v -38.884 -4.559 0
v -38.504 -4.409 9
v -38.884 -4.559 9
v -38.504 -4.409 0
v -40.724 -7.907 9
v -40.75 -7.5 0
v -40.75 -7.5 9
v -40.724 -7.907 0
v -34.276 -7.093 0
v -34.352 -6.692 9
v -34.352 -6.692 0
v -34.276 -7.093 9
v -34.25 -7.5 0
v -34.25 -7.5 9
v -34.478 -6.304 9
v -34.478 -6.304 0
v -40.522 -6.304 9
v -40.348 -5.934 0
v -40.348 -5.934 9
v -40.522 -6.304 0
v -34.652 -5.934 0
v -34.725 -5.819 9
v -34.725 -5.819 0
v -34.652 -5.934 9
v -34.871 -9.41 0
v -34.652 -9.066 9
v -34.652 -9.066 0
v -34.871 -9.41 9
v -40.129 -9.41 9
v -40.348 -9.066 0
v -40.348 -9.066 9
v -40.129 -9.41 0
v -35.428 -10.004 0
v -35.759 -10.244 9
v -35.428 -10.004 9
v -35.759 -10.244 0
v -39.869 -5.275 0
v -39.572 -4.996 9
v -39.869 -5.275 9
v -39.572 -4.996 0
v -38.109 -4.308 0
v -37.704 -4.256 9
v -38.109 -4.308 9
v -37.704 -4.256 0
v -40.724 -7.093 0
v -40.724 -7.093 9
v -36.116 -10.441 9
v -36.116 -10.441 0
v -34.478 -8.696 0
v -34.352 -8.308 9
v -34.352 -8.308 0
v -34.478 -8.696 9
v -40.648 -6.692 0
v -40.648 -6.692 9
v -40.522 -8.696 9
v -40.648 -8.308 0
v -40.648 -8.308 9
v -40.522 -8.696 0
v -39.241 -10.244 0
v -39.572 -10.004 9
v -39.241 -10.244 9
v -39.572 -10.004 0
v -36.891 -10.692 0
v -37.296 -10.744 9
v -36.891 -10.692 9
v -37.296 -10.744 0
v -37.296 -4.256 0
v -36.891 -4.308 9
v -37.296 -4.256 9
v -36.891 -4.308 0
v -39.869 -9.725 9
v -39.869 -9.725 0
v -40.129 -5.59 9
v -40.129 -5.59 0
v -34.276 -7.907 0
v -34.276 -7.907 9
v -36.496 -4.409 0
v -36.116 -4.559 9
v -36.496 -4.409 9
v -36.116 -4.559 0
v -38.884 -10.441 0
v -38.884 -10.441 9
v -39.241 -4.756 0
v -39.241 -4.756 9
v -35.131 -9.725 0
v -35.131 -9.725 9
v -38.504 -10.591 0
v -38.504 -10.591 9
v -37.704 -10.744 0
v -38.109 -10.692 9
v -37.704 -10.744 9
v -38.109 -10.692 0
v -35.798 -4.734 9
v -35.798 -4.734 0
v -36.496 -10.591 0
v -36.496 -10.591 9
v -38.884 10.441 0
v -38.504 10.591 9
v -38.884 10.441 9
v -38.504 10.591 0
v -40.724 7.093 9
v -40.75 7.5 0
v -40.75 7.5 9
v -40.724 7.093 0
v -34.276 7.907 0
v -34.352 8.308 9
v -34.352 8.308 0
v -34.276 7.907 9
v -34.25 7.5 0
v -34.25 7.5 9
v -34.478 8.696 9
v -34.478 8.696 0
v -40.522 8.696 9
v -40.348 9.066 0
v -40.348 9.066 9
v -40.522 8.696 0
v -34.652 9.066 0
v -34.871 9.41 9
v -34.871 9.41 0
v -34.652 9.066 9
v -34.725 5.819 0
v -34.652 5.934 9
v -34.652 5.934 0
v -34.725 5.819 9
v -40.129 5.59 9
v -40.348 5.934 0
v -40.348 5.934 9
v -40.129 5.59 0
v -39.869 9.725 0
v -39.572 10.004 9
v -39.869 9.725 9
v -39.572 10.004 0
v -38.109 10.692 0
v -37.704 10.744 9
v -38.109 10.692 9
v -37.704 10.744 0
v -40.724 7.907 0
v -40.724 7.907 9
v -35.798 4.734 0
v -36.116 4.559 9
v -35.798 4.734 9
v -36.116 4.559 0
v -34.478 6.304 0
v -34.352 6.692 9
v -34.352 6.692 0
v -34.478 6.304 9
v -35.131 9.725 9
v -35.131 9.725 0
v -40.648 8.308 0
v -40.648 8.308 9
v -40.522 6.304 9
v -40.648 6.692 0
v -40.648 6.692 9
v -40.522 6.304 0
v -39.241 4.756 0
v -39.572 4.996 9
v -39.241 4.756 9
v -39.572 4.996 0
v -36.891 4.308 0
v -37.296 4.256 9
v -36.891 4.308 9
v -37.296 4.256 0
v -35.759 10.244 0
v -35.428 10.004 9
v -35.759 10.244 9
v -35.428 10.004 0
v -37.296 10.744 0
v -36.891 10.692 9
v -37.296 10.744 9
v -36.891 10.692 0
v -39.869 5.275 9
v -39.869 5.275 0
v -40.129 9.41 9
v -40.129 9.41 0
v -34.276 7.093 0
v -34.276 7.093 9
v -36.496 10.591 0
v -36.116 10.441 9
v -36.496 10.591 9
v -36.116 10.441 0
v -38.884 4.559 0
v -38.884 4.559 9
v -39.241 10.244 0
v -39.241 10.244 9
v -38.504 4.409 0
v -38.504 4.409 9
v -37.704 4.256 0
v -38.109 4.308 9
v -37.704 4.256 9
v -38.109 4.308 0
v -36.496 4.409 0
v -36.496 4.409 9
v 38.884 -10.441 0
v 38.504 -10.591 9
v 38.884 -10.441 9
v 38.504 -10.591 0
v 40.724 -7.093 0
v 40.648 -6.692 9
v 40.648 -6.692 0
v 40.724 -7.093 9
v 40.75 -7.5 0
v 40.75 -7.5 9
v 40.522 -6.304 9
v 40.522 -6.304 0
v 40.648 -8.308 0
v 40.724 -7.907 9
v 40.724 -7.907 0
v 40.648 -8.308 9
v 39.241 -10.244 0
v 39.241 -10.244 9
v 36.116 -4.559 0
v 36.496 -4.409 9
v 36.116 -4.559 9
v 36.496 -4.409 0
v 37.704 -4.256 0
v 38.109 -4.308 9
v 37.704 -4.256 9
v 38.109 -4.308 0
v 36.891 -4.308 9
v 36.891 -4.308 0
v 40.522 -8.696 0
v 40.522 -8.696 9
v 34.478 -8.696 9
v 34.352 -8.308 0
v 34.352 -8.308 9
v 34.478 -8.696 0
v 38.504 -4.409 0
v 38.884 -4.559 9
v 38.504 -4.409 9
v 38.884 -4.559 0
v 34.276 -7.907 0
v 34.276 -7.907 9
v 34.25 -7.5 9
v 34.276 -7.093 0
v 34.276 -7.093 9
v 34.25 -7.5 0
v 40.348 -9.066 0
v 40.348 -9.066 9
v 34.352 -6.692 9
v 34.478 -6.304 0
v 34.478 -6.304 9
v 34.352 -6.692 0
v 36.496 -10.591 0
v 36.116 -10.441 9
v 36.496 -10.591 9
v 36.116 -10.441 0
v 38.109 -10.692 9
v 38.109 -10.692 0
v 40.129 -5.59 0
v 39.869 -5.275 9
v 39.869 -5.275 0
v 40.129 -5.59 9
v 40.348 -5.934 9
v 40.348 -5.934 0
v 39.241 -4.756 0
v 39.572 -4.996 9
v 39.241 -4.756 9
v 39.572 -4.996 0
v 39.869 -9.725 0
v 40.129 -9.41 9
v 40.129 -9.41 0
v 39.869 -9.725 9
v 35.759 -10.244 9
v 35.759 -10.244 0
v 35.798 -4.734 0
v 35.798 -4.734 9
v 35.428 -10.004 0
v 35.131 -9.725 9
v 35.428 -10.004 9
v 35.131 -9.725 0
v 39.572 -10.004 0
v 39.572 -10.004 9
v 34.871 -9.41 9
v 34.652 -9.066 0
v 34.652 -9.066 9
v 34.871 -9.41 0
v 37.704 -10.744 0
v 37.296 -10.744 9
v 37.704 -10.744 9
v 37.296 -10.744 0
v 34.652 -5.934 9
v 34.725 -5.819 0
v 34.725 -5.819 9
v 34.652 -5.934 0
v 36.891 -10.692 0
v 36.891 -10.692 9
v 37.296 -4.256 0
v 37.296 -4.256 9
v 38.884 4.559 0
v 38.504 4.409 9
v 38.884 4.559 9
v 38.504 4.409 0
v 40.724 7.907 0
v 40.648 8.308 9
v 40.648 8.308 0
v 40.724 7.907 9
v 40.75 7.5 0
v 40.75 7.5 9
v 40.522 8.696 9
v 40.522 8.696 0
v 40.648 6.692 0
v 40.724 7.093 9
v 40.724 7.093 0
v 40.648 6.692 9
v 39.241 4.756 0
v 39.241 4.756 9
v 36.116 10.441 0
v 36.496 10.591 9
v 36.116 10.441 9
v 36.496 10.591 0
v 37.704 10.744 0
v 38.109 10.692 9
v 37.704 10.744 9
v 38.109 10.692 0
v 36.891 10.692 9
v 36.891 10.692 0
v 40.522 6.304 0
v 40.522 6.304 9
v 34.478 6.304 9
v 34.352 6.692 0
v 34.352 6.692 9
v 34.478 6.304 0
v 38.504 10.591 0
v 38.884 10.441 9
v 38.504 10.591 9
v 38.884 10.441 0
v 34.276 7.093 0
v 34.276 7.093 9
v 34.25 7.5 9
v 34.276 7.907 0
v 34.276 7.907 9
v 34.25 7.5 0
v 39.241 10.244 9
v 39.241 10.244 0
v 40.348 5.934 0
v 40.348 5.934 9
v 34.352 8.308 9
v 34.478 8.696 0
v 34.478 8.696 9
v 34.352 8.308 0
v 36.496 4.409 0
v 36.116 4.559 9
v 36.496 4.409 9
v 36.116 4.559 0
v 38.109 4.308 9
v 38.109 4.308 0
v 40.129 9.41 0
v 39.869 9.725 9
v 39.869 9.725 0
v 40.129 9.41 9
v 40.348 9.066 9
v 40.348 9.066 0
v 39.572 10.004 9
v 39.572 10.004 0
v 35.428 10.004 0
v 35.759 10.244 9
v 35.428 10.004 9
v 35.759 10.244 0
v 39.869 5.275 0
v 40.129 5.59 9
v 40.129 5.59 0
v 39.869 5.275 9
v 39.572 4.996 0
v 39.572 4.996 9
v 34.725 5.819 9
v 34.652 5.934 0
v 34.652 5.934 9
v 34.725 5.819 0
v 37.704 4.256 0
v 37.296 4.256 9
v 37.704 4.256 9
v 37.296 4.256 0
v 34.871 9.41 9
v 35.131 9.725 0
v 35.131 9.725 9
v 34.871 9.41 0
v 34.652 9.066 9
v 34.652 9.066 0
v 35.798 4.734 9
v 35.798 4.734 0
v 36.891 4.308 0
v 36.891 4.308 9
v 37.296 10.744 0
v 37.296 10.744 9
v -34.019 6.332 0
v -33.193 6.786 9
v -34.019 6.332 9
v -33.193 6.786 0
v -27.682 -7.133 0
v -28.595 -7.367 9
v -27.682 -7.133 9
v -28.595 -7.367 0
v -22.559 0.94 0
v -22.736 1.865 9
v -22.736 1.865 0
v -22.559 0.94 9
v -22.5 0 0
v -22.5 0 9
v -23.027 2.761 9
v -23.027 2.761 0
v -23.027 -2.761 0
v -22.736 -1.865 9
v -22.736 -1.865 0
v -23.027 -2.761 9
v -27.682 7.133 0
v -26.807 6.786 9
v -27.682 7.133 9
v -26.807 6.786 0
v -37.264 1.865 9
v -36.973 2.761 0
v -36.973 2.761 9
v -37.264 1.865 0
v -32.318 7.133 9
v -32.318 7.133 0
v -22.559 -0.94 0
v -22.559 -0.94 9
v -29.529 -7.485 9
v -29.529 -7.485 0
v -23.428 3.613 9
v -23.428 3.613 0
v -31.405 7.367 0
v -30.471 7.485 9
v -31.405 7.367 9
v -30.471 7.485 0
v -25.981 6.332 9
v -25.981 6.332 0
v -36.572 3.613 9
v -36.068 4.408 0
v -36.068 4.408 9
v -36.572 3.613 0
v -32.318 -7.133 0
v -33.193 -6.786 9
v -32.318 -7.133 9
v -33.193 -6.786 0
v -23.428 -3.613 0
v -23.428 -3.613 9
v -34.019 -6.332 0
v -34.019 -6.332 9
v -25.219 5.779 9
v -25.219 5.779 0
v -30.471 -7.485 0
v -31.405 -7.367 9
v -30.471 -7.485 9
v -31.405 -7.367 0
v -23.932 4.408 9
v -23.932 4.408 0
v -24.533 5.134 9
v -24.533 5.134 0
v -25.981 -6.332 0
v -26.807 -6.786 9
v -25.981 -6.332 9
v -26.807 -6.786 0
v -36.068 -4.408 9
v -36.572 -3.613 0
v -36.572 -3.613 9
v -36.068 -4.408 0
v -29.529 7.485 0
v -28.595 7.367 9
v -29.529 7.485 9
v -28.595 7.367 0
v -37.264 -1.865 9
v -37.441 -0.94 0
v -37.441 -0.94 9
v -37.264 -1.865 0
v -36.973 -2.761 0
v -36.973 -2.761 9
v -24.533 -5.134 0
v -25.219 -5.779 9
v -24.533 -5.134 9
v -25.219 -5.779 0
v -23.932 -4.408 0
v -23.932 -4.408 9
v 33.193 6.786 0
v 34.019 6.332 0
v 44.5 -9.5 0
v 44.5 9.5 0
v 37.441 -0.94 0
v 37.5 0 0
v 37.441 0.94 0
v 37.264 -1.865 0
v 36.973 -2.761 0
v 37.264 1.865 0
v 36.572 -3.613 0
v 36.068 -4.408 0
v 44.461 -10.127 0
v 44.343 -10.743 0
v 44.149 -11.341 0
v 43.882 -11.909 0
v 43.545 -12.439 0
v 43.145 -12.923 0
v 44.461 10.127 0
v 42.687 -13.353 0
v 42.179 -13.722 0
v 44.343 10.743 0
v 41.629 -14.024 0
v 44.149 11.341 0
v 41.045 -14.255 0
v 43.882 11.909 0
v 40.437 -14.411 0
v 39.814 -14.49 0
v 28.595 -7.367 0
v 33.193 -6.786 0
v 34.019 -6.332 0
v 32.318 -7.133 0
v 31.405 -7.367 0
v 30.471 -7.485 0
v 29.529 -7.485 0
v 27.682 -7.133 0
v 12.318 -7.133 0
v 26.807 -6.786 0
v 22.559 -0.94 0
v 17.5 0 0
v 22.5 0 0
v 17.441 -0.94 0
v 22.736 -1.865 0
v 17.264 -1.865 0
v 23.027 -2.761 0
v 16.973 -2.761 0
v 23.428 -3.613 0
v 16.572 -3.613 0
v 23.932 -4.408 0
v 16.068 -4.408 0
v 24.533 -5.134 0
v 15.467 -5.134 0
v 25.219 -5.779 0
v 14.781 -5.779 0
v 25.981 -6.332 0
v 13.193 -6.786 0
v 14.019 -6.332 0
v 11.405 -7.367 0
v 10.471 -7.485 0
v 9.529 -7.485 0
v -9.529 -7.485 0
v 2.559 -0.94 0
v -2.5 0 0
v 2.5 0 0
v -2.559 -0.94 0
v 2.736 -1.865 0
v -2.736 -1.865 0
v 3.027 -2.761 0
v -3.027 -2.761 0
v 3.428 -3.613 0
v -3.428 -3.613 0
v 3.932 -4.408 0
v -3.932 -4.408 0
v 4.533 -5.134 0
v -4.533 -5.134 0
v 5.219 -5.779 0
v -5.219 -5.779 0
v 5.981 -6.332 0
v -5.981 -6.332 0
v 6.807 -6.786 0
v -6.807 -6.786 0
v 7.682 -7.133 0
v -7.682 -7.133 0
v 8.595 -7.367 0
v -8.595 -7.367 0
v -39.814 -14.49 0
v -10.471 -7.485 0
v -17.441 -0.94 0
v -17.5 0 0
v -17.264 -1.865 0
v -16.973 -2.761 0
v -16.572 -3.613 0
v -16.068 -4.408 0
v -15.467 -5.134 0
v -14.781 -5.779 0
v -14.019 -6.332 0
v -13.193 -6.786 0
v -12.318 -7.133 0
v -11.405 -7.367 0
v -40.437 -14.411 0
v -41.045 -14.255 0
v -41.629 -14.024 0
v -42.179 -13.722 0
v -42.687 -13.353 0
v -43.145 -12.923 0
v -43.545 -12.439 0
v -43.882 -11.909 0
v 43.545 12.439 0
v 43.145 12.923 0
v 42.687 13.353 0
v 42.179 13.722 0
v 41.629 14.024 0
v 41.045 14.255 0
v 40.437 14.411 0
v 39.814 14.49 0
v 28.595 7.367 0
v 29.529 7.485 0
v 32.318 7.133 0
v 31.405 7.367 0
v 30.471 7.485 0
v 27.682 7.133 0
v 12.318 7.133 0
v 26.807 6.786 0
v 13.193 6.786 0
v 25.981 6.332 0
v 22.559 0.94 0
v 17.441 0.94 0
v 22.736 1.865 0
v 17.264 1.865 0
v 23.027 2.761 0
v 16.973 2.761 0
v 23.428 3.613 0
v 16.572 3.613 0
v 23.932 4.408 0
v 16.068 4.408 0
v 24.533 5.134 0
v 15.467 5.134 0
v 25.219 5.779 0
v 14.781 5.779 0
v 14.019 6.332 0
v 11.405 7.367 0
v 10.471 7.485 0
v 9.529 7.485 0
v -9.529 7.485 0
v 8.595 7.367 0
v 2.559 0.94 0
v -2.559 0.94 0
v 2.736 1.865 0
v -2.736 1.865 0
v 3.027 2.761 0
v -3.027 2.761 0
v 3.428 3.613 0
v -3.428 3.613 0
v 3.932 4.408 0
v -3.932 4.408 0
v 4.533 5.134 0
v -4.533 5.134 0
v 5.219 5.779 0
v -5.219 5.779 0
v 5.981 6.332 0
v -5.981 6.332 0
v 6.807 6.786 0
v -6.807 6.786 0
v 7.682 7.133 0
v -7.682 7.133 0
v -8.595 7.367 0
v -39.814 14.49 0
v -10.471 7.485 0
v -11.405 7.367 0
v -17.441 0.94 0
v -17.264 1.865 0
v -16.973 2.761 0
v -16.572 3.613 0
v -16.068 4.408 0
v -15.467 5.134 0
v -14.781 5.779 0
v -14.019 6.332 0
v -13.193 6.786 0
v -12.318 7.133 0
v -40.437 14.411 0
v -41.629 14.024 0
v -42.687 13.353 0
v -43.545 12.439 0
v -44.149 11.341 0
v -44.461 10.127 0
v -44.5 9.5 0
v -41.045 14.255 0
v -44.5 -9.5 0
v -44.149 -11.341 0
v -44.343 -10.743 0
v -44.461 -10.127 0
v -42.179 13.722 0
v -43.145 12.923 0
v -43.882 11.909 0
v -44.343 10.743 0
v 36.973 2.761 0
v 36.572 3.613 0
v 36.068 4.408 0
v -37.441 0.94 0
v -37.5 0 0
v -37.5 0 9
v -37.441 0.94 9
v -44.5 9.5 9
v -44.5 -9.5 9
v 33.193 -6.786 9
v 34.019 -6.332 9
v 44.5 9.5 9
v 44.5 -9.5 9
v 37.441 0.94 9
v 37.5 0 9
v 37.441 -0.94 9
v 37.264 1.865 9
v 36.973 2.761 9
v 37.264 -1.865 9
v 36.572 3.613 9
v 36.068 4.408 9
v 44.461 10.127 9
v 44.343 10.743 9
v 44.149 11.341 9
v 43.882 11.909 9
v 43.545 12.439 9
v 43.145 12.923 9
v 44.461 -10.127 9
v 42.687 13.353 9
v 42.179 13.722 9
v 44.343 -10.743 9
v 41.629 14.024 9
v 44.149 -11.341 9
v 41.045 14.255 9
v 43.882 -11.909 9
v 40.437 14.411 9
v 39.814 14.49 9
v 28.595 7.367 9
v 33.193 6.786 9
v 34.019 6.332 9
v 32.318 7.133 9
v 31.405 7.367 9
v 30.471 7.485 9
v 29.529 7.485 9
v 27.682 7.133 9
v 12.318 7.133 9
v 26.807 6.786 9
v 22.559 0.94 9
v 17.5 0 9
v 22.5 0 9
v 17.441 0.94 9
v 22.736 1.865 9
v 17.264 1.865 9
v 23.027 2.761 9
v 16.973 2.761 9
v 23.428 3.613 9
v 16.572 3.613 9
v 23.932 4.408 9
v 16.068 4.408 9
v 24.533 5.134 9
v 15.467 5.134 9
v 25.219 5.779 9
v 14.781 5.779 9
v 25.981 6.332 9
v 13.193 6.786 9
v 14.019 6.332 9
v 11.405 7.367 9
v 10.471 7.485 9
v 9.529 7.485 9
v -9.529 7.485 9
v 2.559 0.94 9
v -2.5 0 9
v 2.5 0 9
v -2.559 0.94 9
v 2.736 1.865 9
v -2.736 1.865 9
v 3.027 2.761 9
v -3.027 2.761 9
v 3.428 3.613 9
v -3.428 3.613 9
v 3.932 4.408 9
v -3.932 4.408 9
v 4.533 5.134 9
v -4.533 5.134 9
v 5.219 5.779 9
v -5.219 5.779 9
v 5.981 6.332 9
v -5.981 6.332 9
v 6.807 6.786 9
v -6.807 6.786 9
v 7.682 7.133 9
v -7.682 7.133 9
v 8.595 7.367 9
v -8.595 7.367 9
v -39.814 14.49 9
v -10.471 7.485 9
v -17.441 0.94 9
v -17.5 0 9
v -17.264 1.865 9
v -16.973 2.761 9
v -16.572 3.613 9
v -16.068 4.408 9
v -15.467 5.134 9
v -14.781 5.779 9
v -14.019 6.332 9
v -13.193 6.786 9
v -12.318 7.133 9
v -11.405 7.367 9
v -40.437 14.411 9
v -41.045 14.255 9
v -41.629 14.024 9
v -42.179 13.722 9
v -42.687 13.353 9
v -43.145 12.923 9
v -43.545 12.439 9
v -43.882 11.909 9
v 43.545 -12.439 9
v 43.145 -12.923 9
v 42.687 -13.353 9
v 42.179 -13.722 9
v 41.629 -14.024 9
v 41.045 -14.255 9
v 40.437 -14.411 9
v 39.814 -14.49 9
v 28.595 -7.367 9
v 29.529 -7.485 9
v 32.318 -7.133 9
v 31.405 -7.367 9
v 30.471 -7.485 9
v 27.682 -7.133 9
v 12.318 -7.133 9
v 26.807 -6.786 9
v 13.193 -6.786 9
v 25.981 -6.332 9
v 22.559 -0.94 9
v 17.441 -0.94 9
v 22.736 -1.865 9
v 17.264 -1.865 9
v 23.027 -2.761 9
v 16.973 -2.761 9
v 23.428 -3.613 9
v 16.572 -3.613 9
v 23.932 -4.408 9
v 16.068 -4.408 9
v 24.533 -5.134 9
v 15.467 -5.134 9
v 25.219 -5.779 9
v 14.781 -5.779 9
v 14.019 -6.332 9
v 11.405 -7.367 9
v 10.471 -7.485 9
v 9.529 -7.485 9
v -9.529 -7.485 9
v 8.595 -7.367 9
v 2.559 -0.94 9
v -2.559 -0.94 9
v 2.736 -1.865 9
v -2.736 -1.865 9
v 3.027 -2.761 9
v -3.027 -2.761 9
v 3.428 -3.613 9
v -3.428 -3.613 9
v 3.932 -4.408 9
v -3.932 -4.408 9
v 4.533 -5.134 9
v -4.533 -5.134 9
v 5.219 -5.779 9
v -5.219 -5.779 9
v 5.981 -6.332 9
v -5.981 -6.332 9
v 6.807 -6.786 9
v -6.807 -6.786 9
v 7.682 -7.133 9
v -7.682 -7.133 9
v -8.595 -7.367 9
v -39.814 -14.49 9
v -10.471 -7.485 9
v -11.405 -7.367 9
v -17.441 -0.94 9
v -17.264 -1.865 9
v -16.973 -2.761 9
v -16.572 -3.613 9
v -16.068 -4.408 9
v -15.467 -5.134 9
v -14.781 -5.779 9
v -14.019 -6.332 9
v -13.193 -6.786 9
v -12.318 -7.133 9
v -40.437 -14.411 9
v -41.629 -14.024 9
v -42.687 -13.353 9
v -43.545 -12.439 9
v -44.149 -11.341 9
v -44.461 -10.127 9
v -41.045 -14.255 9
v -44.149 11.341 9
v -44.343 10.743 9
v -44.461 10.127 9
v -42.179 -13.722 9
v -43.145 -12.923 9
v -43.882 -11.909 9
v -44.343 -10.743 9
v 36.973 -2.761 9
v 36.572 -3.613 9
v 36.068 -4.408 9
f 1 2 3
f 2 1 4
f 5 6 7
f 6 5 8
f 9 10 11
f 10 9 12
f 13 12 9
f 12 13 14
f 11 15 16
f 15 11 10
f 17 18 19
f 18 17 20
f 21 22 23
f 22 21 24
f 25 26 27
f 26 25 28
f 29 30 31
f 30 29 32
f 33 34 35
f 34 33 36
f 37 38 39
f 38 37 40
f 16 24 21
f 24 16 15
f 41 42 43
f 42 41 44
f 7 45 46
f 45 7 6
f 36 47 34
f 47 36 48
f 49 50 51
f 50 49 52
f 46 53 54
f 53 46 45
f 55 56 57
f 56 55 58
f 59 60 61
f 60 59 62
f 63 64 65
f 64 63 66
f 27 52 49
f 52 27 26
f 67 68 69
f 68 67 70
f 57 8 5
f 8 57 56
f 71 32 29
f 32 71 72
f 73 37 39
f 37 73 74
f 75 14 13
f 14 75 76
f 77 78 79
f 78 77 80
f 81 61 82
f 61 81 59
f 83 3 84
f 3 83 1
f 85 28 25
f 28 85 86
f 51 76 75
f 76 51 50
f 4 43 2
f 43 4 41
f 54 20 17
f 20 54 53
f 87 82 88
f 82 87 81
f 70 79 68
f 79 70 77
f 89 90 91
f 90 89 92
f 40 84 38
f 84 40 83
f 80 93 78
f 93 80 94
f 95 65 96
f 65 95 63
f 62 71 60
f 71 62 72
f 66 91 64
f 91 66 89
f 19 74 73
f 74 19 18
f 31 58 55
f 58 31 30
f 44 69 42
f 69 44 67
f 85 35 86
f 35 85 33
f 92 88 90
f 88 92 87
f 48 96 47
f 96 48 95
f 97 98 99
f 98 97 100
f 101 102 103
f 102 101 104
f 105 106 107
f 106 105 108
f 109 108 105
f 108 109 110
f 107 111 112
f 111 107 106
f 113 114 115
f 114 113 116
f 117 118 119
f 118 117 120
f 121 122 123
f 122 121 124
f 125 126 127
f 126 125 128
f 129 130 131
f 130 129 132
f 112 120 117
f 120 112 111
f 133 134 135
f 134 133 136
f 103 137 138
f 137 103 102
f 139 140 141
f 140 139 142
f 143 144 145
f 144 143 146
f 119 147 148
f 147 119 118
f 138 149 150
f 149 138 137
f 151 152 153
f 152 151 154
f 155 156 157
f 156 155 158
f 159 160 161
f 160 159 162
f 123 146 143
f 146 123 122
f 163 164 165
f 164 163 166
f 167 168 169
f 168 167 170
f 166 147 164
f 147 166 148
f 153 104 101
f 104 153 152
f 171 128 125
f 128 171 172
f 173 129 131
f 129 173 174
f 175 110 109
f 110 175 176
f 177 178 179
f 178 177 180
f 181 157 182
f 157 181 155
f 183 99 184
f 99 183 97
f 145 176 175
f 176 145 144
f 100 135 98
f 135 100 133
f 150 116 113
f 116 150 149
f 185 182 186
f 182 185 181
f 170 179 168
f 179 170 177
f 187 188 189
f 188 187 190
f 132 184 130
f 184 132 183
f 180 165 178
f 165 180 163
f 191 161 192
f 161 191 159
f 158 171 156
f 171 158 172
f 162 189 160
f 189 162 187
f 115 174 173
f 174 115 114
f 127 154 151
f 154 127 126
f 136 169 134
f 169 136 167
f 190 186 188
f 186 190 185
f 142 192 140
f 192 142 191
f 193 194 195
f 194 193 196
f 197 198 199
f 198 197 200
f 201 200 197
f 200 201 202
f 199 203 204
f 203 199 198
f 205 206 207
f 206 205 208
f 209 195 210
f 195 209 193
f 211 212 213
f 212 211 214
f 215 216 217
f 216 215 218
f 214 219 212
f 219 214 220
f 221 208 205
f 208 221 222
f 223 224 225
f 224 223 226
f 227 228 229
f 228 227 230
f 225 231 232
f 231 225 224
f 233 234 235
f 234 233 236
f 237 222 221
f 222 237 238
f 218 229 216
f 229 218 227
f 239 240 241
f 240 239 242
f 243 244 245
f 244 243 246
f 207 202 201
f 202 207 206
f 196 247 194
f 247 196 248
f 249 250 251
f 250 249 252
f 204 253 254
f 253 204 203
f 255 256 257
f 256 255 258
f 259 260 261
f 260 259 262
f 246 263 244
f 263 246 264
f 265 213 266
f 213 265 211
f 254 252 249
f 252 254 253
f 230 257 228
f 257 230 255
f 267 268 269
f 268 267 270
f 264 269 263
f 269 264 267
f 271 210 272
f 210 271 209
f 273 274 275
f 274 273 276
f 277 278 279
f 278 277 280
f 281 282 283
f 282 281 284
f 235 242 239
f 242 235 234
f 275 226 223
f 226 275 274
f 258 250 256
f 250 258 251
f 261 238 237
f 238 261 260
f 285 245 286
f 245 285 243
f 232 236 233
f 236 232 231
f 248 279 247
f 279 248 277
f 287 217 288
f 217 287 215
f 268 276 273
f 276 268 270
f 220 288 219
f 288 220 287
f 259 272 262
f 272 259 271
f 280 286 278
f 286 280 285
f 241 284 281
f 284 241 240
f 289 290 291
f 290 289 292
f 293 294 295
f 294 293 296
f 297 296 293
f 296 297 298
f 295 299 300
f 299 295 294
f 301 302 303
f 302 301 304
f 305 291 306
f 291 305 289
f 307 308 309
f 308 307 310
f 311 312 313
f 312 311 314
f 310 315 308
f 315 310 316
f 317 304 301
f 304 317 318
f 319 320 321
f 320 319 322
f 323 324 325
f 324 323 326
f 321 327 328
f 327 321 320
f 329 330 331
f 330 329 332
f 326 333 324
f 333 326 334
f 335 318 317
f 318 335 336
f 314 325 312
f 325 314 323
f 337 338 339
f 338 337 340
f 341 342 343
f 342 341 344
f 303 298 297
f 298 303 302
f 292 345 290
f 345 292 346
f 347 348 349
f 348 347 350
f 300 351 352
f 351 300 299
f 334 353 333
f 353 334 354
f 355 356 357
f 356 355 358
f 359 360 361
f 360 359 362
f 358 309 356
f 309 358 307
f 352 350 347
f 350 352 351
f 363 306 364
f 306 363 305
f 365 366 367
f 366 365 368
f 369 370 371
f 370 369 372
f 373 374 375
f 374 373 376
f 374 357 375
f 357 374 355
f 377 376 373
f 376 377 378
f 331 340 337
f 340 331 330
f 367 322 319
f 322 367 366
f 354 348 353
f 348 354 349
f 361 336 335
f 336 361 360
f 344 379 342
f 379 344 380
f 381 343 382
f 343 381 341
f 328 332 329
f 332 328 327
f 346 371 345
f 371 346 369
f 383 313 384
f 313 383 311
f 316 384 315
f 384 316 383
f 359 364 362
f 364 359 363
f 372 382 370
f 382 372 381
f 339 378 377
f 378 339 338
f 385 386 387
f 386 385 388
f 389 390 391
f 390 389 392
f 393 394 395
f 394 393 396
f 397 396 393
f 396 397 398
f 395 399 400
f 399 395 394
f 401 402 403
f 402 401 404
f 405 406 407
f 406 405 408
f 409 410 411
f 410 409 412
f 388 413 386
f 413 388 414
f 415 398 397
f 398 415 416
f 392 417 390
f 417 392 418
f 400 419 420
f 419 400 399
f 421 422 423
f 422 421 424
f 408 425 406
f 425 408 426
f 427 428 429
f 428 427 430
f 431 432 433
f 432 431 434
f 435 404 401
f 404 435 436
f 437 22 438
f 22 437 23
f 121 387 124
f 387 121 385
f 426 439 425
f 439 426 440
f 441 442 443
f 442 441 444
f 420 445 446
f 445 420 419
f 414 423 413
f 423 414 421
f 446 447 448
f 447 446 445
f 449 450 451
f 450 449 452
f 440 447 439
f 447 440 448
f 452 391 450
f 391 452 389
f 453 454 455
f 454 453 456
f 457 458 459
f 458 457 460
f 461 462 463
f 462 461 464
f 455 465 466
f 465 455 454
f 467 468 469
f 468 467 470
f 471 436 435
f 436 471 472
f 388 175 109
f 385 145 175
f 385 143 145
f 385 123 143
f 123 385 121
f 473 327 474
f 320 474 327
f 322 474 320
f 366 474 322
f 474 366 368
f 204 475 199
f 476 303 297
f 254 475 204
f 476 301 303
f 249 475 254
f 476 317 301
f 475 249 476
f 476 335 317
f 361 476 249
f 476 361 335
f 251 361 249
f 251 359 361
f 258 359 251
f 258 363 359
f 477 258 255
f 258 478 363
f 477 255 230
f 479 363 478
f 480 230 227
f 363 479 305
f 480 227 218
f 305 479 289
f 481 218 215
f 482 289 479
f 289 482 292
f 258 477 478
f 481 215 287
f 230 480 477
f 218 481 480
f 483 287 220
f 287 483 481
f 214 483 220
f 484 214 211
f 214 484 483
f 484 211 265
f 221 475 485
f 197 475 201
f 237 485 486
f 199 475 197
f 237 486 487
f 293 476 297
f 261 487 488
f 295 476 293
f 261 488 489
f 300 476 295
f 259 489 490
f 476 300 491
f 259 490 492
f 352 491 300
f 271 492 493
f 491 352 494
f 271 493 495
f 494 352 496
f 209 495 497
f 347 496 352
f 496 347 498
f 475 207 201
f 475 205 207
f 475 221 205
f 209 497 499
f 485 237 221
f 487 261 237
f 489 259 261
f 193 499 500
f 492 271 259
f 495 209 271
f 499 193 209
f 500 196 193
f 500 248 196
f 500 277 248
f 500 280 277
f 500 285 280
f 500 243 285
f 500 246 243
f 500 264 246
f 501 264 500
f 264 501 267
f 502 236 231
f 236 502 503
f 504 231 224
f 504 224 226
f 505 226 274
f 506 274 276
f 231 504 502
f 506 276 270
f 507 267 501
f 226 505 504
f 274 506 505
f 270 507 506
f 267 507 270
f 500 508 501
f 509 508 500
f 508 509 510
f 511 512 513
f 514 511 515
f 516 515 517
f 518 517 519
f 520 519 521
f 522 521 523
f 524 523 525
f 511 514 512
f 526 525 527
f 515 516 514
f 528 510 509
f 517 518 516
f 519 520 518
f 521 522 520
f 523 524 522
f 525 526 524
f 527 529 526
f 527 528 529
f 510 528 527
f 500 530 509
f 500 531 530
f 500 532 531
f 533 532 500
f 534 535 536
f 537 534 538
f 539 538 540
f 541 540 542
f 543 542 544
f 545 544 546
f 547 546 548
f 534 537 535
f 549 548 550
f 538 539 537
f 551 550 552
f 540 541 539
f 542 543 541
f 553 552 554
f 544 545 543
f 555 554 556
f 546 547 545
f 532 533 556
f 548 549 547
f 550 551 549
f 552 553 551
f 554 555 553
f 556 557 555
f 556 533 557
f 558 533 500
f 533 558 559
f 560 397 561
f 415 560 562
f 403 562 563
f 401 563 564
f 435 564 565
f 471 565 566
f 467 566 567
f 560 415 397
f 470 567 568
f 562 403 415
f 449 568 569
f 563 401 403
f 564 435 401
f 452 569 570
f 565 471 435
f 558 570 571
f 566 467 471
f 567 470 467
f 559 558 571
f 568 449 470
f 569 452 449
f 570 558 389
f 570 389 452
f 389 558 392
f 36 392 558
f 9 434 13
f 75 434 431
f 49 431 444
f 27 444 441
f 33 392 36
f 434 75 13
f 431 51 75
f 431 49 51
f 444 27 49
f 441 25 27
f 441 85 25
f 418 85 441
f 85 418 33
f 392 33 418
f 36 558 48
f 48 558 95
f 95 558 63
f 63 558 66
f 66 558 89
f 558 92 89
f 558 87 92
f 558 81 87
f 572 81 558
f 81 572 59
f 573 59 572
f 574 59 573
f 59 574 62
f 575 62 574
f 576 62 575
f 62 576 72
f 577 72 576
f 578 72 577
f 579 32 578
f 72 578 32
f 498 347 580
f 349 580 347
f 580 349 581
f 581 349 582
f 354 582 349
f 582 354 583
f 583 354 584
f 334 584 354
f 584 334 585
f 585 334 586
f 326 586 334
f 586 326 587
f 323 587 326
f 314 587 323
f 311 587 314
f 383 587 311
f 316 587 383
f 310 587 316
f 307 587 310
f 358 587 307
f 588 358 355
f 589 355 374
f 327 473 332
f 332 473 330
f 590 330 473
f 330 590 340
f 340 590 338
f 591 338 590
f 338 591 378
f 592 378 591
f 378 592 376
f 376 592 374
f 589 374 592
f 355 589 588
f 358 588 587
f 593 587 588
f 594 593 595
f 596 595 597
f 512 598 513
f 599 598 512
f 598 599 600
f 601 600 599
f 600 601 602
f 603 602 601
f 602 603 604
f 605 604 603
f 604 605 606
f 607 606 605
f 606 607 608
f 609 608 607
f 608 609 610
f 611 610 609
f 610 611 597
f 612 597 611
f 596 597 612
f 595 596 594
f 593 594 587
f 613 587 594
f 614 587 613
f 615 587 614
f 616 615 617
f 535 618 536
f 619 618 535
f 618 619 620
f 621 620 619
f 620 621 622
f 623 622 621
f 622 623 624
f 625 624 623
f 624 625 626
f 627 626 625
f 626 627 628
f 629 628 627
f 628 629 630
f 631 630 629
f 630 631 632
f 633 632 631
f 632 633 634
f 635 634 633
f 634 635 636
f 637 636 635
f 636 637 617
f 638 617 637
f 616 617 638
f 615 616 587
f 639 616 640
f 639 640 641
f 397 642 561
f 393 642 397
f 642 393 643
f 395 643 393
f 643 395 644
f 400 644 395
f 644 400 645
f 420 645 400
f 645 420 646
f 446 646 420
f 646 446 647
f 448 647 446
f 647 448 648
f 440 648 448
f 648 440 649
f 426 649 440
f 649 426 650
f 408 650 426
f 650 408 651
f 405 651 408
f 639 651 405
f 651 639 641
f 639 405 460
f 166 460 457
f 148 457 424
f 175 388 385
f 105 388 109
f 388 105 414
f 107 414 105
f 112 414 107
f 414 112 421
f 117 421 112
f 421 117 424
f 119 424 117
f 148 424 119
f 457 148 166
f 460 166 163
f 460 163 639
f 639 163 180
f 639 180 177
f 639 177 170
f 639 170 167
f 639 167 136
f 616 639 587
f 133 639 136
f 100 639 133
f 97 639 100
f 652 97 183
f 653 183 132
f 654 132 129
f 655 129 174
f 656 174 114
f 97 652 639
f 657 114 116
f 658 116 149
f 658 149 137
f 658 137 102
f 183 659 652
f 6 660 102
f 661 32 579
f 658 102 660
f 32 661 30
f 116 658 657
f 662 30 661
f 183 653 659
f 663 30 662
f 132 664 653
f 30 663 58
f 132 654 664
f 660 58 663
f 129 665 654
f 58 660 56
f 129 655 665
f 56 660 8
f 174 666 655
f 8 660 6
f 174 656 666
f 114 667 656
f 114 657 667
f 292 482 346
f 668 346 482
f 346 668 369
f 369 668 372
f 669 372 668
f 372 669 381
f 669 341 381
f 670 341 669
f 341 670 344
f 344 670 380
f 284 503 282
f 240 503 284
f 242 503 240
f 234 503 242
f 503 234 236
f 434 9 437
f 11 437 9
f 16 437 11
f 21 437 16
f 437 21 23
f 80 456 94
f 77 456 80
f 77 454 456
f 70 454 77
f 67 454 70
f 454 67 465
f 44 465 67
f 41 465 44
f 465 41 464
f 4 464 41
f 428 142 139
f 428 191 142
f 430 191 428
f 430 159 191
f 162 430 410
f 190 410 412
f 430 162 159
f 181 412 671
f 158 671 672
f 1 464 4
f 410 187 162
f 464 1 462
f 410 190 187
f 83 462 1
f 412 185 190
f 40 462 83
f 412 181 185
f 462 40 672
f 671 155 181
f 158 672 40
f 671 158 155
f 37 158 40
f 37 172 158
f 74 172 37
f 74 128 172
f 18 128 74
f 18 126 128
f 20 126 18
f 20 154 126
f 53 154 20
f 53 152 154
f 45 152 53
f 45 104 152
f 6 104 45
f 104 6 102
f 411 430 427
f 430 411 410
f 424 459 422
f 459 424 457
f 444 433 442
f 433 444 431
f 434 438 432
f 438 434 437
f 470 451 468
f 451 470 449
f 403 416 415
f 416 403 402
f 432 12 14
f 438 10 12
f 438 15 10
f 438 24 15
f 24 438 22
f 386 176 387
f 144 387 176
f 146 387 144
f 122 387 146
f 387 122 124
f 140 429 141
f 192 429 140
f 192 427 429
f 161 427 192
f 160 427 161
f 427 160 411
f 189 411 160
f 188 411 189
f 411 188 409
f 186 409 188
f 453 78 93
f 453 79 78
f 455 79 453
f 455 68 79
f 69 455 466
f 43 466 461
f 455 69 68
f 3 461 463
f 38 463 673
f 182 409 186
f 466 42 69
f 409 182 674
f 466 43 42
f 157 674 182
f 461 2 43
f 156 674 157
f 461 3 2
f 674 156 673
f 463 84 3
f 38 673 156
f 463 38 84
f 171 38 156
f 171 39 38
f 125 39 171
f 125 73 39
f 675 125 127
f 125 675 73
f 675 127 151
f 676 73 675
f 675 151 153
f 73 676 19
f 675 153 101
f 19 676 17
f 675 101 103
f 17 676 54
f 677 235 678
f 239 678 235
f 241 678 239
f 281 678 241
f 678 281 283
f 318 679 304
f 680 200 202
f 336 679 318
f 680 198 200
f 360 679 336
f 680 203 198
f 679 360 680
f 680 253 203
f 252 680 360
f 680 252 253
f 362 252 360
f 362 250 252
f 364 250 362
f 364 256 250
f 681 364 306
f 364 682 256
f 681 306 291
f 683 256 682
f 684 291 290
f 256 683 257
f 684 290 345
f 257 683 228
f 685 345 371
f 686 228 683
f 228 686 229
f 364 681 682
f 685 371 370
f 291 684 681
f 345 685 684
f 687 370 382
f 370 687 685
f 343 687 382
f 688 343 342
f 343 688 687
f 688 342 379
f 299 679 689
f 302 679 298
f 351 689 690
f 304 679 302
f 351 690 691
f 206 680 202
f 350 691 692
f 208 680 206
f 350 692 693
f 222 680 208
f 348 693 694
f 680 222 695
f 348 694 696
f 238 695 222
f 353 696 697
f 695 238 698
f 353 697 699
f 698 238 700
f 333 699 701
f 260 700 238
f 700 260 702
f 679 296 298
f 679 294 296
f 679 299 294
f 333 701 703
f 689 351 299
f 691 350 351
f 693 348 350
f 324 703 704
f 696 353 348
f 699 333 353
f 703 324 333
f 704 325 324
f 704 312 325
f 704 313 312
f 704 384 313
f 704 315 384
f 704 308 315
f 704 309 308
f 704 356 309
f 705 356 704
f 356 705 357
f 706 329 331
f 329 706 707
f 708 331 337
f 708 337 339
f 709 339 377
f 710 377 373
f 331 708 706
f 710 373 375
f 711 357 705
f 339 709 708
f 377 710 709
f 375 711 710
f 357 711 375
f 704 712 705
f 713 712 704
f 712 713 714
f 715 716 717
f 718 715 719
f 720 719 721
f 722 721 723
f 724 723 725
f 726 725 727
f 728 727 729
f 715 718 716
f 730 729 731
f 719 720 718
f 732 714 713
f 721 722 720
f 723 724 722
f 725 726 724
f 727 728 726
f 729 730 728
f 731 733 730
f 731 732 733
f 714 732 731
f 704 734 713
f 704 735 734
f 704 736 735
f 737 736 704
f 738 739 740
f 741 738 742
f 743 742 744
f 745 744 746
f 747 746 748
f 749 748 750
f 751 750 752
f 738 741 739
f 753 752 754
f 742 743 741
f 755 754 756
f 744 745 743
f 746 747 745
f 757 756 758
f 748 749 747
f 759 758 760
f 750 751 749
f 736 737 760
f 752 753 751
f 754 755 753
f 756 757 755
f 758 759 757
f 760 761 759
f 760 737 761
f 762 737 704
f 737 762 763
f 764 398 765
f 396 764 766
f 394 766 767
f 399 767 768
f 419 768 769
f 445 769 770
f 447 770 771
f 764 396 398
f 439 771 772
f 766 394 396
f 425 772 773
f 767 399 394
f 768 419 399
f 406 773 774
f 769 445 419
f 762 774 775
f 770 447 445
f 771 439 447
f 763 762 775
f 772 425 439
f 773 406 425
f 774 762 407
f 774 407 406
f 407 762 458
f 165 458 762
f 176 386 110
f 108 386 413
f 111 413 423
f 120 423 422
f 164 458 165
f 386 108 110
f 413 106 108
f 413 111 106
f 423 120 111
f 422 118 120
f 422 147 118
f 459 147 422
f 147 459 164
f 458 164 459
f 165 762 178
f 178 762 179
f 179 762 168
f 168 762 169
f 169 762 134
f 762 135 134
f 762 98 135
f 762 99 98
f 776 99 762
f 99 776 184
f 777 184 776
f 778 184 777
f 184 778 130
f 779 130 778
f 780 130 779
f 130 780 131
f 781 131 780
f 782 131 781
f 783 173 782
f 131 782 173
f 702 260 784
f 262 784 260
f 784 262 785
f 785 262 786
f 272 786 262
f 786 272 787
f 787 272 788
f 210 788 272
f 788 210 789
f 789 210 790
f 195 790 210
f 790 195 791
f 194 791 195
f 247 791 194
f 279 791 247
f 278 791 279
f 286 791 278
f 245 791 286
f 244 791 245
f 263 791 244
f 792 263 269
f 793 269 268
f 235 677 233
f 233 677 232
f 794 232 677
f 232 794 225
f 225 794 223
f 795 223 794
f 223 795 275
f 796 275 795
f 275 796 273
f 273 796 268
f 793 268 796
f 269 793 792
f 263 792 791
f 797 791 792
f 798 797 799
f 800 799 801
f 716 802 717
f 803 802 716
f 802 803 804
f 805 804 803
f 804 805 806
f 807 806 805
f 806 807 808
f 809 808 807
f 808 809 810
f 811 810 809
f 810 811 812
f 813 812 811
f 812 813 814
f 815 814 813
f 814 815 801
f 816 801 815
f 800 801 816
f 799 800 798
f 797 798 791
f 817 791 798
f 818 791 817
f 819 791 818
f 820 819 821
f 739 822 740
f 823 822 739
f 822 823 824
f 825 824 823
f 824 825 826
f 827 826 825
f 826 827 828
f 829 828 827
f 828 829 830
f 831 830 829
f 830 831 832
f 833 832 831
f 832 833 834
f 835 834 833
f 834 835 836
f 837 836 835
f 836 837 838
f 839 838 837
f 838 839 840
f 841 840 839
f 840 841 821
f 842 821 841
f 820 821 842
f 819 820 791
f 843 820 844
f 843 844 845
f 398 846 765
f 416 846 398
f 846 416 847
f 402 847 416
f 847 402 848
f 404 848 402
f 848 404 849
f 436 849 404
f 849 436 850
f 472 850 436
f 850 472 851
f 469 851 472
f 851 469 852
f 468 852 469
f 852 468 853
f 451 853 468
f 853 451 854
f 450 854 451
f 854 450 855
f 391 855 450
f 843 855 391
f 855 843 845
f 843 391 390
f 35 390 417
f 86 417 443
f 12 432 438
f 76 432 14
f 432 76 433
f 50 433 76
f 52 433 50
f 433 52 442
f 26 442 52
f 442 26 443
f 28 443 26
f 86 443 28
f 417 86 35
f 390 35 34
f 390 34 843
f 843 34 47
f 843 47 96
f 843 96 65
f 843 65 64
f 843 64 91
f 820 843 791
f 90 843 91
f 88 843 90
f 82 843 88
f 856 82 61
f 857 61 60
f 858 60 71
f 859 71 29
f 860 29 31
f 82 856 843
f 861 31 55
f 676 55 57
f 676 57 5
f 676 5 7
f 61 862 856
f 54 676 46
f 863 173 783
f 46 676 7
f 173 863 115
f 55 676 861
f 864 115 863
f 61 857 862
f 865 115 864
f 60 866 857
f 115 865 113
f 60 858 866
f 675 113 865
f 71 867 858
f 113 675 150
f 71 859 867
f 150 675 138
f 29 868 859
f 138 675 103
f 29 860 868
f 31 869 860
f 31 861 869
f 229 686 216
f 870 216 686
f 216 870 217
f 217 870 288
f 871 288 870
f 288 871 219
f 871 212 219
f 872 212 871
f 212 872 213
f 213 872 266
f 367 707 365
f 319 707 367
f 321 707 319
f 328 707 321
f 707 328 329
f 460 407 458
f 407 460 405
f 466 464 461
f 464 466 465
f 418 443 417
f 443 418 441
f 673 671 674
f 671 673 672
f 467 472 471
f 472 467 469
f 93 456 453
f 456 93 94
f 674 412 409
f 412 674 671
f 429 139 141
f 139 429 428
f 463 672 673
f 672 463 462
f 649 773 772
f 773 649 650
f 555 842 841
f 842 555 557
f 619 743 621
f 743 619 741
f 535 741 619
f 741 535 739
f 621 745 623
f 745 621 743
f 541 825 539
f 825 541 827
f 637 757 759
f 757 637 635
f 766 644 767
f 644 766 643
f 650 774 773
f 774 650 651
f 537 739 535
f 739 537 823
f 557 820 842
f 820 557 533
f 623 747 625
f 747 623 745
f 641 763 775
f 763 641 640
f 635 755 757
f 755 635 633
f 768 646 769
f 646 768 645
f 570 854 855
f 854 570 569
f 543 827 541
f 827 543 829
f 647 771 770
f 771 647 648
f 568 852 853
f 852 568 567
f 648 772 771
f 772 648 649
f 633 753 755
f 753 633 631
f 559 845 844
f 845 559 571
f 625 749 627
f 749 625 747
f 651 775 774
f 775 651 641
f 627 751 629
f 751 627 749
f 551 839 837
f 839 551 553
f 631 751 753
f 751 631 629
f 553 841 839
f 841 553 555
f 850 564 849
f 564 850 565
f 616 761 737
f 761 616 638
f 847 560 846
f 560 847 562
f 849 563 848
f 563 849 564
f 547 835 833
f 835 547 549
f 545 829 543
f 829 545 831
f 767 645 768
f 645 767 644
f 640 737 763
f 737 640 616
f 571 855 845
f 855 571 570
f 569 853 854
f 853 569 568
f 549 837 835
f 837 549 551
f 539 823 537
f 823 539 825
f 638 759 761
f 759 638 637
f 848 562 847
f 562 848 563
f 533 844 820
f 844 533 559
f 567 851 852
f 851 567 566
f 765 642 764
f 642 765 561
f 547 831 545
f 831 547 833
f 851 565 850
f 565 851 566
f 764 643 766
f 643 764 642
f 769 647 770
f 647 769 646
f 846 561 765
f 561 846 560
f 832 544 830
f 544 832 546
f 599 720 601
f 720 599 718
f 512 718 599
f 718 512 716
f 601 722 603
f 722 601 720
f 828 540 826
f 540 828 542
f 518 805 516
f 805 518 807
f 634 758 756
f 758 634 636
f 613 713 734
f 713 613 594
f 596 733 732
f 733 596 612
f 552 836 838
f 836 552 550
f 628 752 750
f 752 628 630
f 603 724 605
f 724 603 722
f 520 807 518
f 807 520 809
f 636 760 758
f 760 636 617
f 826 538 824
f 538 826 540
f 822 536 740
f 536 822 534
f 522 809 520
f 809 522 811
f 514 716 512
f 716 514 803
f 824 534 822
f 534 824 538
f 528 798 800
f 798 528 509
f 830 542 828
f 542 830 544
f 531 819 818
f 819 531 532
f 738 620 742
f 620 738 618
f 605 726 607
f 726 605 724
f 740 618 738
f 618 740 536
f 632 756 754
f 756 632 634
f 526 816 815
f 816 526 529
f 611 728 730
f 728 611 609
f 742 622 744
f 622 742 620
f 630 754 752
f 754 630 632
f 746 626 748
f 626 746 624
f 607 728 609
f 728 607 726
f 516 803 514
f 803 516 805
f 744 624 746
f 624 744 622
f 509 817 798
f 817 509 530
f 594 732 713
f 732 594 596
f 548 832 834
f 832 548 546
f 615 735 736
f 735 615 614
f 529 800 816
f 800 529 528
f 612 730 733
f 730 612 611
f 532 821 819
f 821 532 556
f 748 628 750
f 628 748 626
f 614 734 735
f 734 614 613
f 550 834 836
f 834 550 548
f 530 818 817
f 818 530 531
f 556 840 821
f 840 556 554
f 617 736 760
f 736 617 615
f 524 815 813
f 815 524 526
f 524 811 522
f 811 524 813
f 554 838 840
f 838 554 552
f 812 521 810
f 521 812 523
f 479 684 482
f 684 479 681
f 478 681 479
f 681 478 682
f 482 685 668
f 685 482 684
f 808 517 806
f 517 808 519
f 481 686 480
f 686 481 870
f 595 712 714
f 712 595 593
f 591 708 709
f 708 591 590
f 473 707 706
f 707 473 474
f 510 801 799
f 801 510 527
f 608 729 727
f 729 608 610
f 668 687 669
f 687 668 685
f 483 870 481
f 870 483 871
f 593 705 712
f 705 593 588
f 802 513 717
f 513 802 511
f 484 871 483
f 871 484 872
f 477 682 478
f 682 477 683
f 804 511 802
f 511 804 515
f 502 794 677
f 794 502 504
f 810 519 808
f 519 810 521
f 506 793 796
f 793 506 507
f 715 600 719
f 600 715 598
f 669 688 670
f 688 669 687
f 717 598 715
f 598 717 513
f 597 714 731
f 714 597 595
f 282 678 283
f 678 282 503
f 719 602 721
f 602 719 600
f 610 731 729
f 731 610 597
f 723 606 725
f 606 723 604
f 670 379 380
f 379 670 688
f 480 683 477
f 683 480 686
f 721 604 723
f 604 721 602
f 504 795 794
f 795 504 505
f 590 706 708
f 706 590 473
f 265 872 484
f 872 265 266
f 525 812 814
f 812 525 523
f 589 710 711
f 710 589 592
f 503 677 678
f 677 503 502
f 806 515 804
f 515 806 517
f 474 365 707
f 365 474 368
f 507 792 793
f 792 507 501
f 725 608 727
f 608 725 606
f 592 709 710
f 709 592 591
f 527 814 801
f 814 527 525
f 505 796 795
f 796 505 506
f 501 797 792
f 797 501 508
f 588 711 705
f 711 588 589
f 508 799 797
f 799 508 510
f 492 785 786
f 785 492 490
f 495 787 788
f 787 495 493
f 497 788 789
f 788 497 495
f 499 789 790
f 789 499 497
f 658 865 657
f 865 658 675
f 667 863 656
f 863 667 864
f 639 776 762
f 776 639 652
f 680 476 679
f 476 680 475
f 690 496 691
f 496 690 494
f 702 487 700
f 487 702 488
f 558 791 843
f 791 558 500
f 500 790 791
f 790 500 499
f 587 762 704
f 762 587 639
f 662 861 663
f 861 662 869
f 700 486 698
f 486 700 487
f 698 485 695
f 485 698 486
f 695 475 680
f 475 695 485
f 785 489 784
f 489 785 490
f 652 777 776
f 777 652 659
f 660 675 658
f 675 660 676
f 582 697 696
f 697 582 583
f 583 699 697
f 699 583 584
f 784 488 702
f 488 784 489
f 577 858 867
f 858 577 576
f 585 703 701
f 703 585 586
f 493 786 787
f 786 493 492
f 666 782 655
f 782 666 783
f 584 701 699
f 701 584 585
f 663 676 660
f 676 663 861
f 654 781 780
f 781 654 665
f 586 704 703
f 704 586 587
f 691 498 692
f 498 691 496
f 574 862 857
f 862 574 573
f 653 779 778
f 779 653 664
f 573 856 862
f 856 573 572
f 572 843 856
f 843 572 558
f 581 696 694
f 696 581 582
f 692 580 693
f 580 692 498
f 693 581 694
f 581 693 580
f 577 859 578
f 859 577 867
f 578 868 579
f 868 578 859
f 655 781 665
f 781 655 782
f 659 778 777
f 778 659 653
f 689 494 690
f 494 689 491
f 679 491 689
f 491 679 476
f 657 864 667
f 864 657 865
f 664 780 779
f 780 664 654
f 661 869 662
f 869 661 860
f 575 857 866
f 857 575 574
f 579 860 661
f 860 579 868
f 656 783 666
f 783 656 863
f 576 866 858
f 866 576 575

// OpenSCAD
$fn = 50;

difference() {
	union() {
		hull() {
			translate(v = [-39.5, 9.5, 0]) {
				cylinder(h = 9, r = 5);
			}
			translate(v = [39.5, 9.5, 0]) {
				cylinder(h = 9, r = 5);
			}
			translate(v = [-39.5, -9.5, 0]) {
				cylinder(h = 9, r = 5);
			}
			translate(v = [39.5, -9.5, 0]) {
				cylinder(h = 9, r = 5);
			}
		}
	}
	union() {
		translate(v = [-37.5, -7.5, -100.0]) {
			cylinder(h = 200, r = 3.25);
		}
		translate(v = [-37.5, 7.5, -100.0]) {
			cylinder(h = 200, r = 3.25);
		}
		translate(v = [37.5, -7.5, -100.0]) {
			cylinder(h = 200, r = 3.25);
		}
		translate(v = [37.5, 7.5, -100.0]) {
			cylinder(h = 200, r = 3.25);
		}
		translate(v = [-37.5, -7.5, -100.0]) {
			cylinder(h = 200, r = 1.8);
		}
		translate(v = [-37.5, 7.5, -100.0]) {
			cylinder(h = 200, r = 1.8);
		}
		translate(v = [37.5, -7.5, -100.0]) {
			cylinder(h = 200, r = 1.8);
		}
		translate(v = [37.5, 7.5, -100.0]) {
			cylinder(h = 200, r = 1.8);
		}
		translate(v = [-30.0, 0, 0.0]) {
			cylinder(h = 9, r = 7.5);
		}
		translate(v = [-10.0, 0, 0.0]) {
			cylinder(h = 9, r = 7.5);
		}
		translate(v = [10.0, 0, 0.0]) {
			cylinder(h = 9, r = 7.5);
		}
		translate(v = [30.0, 0, 0.0]) {
			cylinder(h = 9, r = 7.5);
		}
	}
}
